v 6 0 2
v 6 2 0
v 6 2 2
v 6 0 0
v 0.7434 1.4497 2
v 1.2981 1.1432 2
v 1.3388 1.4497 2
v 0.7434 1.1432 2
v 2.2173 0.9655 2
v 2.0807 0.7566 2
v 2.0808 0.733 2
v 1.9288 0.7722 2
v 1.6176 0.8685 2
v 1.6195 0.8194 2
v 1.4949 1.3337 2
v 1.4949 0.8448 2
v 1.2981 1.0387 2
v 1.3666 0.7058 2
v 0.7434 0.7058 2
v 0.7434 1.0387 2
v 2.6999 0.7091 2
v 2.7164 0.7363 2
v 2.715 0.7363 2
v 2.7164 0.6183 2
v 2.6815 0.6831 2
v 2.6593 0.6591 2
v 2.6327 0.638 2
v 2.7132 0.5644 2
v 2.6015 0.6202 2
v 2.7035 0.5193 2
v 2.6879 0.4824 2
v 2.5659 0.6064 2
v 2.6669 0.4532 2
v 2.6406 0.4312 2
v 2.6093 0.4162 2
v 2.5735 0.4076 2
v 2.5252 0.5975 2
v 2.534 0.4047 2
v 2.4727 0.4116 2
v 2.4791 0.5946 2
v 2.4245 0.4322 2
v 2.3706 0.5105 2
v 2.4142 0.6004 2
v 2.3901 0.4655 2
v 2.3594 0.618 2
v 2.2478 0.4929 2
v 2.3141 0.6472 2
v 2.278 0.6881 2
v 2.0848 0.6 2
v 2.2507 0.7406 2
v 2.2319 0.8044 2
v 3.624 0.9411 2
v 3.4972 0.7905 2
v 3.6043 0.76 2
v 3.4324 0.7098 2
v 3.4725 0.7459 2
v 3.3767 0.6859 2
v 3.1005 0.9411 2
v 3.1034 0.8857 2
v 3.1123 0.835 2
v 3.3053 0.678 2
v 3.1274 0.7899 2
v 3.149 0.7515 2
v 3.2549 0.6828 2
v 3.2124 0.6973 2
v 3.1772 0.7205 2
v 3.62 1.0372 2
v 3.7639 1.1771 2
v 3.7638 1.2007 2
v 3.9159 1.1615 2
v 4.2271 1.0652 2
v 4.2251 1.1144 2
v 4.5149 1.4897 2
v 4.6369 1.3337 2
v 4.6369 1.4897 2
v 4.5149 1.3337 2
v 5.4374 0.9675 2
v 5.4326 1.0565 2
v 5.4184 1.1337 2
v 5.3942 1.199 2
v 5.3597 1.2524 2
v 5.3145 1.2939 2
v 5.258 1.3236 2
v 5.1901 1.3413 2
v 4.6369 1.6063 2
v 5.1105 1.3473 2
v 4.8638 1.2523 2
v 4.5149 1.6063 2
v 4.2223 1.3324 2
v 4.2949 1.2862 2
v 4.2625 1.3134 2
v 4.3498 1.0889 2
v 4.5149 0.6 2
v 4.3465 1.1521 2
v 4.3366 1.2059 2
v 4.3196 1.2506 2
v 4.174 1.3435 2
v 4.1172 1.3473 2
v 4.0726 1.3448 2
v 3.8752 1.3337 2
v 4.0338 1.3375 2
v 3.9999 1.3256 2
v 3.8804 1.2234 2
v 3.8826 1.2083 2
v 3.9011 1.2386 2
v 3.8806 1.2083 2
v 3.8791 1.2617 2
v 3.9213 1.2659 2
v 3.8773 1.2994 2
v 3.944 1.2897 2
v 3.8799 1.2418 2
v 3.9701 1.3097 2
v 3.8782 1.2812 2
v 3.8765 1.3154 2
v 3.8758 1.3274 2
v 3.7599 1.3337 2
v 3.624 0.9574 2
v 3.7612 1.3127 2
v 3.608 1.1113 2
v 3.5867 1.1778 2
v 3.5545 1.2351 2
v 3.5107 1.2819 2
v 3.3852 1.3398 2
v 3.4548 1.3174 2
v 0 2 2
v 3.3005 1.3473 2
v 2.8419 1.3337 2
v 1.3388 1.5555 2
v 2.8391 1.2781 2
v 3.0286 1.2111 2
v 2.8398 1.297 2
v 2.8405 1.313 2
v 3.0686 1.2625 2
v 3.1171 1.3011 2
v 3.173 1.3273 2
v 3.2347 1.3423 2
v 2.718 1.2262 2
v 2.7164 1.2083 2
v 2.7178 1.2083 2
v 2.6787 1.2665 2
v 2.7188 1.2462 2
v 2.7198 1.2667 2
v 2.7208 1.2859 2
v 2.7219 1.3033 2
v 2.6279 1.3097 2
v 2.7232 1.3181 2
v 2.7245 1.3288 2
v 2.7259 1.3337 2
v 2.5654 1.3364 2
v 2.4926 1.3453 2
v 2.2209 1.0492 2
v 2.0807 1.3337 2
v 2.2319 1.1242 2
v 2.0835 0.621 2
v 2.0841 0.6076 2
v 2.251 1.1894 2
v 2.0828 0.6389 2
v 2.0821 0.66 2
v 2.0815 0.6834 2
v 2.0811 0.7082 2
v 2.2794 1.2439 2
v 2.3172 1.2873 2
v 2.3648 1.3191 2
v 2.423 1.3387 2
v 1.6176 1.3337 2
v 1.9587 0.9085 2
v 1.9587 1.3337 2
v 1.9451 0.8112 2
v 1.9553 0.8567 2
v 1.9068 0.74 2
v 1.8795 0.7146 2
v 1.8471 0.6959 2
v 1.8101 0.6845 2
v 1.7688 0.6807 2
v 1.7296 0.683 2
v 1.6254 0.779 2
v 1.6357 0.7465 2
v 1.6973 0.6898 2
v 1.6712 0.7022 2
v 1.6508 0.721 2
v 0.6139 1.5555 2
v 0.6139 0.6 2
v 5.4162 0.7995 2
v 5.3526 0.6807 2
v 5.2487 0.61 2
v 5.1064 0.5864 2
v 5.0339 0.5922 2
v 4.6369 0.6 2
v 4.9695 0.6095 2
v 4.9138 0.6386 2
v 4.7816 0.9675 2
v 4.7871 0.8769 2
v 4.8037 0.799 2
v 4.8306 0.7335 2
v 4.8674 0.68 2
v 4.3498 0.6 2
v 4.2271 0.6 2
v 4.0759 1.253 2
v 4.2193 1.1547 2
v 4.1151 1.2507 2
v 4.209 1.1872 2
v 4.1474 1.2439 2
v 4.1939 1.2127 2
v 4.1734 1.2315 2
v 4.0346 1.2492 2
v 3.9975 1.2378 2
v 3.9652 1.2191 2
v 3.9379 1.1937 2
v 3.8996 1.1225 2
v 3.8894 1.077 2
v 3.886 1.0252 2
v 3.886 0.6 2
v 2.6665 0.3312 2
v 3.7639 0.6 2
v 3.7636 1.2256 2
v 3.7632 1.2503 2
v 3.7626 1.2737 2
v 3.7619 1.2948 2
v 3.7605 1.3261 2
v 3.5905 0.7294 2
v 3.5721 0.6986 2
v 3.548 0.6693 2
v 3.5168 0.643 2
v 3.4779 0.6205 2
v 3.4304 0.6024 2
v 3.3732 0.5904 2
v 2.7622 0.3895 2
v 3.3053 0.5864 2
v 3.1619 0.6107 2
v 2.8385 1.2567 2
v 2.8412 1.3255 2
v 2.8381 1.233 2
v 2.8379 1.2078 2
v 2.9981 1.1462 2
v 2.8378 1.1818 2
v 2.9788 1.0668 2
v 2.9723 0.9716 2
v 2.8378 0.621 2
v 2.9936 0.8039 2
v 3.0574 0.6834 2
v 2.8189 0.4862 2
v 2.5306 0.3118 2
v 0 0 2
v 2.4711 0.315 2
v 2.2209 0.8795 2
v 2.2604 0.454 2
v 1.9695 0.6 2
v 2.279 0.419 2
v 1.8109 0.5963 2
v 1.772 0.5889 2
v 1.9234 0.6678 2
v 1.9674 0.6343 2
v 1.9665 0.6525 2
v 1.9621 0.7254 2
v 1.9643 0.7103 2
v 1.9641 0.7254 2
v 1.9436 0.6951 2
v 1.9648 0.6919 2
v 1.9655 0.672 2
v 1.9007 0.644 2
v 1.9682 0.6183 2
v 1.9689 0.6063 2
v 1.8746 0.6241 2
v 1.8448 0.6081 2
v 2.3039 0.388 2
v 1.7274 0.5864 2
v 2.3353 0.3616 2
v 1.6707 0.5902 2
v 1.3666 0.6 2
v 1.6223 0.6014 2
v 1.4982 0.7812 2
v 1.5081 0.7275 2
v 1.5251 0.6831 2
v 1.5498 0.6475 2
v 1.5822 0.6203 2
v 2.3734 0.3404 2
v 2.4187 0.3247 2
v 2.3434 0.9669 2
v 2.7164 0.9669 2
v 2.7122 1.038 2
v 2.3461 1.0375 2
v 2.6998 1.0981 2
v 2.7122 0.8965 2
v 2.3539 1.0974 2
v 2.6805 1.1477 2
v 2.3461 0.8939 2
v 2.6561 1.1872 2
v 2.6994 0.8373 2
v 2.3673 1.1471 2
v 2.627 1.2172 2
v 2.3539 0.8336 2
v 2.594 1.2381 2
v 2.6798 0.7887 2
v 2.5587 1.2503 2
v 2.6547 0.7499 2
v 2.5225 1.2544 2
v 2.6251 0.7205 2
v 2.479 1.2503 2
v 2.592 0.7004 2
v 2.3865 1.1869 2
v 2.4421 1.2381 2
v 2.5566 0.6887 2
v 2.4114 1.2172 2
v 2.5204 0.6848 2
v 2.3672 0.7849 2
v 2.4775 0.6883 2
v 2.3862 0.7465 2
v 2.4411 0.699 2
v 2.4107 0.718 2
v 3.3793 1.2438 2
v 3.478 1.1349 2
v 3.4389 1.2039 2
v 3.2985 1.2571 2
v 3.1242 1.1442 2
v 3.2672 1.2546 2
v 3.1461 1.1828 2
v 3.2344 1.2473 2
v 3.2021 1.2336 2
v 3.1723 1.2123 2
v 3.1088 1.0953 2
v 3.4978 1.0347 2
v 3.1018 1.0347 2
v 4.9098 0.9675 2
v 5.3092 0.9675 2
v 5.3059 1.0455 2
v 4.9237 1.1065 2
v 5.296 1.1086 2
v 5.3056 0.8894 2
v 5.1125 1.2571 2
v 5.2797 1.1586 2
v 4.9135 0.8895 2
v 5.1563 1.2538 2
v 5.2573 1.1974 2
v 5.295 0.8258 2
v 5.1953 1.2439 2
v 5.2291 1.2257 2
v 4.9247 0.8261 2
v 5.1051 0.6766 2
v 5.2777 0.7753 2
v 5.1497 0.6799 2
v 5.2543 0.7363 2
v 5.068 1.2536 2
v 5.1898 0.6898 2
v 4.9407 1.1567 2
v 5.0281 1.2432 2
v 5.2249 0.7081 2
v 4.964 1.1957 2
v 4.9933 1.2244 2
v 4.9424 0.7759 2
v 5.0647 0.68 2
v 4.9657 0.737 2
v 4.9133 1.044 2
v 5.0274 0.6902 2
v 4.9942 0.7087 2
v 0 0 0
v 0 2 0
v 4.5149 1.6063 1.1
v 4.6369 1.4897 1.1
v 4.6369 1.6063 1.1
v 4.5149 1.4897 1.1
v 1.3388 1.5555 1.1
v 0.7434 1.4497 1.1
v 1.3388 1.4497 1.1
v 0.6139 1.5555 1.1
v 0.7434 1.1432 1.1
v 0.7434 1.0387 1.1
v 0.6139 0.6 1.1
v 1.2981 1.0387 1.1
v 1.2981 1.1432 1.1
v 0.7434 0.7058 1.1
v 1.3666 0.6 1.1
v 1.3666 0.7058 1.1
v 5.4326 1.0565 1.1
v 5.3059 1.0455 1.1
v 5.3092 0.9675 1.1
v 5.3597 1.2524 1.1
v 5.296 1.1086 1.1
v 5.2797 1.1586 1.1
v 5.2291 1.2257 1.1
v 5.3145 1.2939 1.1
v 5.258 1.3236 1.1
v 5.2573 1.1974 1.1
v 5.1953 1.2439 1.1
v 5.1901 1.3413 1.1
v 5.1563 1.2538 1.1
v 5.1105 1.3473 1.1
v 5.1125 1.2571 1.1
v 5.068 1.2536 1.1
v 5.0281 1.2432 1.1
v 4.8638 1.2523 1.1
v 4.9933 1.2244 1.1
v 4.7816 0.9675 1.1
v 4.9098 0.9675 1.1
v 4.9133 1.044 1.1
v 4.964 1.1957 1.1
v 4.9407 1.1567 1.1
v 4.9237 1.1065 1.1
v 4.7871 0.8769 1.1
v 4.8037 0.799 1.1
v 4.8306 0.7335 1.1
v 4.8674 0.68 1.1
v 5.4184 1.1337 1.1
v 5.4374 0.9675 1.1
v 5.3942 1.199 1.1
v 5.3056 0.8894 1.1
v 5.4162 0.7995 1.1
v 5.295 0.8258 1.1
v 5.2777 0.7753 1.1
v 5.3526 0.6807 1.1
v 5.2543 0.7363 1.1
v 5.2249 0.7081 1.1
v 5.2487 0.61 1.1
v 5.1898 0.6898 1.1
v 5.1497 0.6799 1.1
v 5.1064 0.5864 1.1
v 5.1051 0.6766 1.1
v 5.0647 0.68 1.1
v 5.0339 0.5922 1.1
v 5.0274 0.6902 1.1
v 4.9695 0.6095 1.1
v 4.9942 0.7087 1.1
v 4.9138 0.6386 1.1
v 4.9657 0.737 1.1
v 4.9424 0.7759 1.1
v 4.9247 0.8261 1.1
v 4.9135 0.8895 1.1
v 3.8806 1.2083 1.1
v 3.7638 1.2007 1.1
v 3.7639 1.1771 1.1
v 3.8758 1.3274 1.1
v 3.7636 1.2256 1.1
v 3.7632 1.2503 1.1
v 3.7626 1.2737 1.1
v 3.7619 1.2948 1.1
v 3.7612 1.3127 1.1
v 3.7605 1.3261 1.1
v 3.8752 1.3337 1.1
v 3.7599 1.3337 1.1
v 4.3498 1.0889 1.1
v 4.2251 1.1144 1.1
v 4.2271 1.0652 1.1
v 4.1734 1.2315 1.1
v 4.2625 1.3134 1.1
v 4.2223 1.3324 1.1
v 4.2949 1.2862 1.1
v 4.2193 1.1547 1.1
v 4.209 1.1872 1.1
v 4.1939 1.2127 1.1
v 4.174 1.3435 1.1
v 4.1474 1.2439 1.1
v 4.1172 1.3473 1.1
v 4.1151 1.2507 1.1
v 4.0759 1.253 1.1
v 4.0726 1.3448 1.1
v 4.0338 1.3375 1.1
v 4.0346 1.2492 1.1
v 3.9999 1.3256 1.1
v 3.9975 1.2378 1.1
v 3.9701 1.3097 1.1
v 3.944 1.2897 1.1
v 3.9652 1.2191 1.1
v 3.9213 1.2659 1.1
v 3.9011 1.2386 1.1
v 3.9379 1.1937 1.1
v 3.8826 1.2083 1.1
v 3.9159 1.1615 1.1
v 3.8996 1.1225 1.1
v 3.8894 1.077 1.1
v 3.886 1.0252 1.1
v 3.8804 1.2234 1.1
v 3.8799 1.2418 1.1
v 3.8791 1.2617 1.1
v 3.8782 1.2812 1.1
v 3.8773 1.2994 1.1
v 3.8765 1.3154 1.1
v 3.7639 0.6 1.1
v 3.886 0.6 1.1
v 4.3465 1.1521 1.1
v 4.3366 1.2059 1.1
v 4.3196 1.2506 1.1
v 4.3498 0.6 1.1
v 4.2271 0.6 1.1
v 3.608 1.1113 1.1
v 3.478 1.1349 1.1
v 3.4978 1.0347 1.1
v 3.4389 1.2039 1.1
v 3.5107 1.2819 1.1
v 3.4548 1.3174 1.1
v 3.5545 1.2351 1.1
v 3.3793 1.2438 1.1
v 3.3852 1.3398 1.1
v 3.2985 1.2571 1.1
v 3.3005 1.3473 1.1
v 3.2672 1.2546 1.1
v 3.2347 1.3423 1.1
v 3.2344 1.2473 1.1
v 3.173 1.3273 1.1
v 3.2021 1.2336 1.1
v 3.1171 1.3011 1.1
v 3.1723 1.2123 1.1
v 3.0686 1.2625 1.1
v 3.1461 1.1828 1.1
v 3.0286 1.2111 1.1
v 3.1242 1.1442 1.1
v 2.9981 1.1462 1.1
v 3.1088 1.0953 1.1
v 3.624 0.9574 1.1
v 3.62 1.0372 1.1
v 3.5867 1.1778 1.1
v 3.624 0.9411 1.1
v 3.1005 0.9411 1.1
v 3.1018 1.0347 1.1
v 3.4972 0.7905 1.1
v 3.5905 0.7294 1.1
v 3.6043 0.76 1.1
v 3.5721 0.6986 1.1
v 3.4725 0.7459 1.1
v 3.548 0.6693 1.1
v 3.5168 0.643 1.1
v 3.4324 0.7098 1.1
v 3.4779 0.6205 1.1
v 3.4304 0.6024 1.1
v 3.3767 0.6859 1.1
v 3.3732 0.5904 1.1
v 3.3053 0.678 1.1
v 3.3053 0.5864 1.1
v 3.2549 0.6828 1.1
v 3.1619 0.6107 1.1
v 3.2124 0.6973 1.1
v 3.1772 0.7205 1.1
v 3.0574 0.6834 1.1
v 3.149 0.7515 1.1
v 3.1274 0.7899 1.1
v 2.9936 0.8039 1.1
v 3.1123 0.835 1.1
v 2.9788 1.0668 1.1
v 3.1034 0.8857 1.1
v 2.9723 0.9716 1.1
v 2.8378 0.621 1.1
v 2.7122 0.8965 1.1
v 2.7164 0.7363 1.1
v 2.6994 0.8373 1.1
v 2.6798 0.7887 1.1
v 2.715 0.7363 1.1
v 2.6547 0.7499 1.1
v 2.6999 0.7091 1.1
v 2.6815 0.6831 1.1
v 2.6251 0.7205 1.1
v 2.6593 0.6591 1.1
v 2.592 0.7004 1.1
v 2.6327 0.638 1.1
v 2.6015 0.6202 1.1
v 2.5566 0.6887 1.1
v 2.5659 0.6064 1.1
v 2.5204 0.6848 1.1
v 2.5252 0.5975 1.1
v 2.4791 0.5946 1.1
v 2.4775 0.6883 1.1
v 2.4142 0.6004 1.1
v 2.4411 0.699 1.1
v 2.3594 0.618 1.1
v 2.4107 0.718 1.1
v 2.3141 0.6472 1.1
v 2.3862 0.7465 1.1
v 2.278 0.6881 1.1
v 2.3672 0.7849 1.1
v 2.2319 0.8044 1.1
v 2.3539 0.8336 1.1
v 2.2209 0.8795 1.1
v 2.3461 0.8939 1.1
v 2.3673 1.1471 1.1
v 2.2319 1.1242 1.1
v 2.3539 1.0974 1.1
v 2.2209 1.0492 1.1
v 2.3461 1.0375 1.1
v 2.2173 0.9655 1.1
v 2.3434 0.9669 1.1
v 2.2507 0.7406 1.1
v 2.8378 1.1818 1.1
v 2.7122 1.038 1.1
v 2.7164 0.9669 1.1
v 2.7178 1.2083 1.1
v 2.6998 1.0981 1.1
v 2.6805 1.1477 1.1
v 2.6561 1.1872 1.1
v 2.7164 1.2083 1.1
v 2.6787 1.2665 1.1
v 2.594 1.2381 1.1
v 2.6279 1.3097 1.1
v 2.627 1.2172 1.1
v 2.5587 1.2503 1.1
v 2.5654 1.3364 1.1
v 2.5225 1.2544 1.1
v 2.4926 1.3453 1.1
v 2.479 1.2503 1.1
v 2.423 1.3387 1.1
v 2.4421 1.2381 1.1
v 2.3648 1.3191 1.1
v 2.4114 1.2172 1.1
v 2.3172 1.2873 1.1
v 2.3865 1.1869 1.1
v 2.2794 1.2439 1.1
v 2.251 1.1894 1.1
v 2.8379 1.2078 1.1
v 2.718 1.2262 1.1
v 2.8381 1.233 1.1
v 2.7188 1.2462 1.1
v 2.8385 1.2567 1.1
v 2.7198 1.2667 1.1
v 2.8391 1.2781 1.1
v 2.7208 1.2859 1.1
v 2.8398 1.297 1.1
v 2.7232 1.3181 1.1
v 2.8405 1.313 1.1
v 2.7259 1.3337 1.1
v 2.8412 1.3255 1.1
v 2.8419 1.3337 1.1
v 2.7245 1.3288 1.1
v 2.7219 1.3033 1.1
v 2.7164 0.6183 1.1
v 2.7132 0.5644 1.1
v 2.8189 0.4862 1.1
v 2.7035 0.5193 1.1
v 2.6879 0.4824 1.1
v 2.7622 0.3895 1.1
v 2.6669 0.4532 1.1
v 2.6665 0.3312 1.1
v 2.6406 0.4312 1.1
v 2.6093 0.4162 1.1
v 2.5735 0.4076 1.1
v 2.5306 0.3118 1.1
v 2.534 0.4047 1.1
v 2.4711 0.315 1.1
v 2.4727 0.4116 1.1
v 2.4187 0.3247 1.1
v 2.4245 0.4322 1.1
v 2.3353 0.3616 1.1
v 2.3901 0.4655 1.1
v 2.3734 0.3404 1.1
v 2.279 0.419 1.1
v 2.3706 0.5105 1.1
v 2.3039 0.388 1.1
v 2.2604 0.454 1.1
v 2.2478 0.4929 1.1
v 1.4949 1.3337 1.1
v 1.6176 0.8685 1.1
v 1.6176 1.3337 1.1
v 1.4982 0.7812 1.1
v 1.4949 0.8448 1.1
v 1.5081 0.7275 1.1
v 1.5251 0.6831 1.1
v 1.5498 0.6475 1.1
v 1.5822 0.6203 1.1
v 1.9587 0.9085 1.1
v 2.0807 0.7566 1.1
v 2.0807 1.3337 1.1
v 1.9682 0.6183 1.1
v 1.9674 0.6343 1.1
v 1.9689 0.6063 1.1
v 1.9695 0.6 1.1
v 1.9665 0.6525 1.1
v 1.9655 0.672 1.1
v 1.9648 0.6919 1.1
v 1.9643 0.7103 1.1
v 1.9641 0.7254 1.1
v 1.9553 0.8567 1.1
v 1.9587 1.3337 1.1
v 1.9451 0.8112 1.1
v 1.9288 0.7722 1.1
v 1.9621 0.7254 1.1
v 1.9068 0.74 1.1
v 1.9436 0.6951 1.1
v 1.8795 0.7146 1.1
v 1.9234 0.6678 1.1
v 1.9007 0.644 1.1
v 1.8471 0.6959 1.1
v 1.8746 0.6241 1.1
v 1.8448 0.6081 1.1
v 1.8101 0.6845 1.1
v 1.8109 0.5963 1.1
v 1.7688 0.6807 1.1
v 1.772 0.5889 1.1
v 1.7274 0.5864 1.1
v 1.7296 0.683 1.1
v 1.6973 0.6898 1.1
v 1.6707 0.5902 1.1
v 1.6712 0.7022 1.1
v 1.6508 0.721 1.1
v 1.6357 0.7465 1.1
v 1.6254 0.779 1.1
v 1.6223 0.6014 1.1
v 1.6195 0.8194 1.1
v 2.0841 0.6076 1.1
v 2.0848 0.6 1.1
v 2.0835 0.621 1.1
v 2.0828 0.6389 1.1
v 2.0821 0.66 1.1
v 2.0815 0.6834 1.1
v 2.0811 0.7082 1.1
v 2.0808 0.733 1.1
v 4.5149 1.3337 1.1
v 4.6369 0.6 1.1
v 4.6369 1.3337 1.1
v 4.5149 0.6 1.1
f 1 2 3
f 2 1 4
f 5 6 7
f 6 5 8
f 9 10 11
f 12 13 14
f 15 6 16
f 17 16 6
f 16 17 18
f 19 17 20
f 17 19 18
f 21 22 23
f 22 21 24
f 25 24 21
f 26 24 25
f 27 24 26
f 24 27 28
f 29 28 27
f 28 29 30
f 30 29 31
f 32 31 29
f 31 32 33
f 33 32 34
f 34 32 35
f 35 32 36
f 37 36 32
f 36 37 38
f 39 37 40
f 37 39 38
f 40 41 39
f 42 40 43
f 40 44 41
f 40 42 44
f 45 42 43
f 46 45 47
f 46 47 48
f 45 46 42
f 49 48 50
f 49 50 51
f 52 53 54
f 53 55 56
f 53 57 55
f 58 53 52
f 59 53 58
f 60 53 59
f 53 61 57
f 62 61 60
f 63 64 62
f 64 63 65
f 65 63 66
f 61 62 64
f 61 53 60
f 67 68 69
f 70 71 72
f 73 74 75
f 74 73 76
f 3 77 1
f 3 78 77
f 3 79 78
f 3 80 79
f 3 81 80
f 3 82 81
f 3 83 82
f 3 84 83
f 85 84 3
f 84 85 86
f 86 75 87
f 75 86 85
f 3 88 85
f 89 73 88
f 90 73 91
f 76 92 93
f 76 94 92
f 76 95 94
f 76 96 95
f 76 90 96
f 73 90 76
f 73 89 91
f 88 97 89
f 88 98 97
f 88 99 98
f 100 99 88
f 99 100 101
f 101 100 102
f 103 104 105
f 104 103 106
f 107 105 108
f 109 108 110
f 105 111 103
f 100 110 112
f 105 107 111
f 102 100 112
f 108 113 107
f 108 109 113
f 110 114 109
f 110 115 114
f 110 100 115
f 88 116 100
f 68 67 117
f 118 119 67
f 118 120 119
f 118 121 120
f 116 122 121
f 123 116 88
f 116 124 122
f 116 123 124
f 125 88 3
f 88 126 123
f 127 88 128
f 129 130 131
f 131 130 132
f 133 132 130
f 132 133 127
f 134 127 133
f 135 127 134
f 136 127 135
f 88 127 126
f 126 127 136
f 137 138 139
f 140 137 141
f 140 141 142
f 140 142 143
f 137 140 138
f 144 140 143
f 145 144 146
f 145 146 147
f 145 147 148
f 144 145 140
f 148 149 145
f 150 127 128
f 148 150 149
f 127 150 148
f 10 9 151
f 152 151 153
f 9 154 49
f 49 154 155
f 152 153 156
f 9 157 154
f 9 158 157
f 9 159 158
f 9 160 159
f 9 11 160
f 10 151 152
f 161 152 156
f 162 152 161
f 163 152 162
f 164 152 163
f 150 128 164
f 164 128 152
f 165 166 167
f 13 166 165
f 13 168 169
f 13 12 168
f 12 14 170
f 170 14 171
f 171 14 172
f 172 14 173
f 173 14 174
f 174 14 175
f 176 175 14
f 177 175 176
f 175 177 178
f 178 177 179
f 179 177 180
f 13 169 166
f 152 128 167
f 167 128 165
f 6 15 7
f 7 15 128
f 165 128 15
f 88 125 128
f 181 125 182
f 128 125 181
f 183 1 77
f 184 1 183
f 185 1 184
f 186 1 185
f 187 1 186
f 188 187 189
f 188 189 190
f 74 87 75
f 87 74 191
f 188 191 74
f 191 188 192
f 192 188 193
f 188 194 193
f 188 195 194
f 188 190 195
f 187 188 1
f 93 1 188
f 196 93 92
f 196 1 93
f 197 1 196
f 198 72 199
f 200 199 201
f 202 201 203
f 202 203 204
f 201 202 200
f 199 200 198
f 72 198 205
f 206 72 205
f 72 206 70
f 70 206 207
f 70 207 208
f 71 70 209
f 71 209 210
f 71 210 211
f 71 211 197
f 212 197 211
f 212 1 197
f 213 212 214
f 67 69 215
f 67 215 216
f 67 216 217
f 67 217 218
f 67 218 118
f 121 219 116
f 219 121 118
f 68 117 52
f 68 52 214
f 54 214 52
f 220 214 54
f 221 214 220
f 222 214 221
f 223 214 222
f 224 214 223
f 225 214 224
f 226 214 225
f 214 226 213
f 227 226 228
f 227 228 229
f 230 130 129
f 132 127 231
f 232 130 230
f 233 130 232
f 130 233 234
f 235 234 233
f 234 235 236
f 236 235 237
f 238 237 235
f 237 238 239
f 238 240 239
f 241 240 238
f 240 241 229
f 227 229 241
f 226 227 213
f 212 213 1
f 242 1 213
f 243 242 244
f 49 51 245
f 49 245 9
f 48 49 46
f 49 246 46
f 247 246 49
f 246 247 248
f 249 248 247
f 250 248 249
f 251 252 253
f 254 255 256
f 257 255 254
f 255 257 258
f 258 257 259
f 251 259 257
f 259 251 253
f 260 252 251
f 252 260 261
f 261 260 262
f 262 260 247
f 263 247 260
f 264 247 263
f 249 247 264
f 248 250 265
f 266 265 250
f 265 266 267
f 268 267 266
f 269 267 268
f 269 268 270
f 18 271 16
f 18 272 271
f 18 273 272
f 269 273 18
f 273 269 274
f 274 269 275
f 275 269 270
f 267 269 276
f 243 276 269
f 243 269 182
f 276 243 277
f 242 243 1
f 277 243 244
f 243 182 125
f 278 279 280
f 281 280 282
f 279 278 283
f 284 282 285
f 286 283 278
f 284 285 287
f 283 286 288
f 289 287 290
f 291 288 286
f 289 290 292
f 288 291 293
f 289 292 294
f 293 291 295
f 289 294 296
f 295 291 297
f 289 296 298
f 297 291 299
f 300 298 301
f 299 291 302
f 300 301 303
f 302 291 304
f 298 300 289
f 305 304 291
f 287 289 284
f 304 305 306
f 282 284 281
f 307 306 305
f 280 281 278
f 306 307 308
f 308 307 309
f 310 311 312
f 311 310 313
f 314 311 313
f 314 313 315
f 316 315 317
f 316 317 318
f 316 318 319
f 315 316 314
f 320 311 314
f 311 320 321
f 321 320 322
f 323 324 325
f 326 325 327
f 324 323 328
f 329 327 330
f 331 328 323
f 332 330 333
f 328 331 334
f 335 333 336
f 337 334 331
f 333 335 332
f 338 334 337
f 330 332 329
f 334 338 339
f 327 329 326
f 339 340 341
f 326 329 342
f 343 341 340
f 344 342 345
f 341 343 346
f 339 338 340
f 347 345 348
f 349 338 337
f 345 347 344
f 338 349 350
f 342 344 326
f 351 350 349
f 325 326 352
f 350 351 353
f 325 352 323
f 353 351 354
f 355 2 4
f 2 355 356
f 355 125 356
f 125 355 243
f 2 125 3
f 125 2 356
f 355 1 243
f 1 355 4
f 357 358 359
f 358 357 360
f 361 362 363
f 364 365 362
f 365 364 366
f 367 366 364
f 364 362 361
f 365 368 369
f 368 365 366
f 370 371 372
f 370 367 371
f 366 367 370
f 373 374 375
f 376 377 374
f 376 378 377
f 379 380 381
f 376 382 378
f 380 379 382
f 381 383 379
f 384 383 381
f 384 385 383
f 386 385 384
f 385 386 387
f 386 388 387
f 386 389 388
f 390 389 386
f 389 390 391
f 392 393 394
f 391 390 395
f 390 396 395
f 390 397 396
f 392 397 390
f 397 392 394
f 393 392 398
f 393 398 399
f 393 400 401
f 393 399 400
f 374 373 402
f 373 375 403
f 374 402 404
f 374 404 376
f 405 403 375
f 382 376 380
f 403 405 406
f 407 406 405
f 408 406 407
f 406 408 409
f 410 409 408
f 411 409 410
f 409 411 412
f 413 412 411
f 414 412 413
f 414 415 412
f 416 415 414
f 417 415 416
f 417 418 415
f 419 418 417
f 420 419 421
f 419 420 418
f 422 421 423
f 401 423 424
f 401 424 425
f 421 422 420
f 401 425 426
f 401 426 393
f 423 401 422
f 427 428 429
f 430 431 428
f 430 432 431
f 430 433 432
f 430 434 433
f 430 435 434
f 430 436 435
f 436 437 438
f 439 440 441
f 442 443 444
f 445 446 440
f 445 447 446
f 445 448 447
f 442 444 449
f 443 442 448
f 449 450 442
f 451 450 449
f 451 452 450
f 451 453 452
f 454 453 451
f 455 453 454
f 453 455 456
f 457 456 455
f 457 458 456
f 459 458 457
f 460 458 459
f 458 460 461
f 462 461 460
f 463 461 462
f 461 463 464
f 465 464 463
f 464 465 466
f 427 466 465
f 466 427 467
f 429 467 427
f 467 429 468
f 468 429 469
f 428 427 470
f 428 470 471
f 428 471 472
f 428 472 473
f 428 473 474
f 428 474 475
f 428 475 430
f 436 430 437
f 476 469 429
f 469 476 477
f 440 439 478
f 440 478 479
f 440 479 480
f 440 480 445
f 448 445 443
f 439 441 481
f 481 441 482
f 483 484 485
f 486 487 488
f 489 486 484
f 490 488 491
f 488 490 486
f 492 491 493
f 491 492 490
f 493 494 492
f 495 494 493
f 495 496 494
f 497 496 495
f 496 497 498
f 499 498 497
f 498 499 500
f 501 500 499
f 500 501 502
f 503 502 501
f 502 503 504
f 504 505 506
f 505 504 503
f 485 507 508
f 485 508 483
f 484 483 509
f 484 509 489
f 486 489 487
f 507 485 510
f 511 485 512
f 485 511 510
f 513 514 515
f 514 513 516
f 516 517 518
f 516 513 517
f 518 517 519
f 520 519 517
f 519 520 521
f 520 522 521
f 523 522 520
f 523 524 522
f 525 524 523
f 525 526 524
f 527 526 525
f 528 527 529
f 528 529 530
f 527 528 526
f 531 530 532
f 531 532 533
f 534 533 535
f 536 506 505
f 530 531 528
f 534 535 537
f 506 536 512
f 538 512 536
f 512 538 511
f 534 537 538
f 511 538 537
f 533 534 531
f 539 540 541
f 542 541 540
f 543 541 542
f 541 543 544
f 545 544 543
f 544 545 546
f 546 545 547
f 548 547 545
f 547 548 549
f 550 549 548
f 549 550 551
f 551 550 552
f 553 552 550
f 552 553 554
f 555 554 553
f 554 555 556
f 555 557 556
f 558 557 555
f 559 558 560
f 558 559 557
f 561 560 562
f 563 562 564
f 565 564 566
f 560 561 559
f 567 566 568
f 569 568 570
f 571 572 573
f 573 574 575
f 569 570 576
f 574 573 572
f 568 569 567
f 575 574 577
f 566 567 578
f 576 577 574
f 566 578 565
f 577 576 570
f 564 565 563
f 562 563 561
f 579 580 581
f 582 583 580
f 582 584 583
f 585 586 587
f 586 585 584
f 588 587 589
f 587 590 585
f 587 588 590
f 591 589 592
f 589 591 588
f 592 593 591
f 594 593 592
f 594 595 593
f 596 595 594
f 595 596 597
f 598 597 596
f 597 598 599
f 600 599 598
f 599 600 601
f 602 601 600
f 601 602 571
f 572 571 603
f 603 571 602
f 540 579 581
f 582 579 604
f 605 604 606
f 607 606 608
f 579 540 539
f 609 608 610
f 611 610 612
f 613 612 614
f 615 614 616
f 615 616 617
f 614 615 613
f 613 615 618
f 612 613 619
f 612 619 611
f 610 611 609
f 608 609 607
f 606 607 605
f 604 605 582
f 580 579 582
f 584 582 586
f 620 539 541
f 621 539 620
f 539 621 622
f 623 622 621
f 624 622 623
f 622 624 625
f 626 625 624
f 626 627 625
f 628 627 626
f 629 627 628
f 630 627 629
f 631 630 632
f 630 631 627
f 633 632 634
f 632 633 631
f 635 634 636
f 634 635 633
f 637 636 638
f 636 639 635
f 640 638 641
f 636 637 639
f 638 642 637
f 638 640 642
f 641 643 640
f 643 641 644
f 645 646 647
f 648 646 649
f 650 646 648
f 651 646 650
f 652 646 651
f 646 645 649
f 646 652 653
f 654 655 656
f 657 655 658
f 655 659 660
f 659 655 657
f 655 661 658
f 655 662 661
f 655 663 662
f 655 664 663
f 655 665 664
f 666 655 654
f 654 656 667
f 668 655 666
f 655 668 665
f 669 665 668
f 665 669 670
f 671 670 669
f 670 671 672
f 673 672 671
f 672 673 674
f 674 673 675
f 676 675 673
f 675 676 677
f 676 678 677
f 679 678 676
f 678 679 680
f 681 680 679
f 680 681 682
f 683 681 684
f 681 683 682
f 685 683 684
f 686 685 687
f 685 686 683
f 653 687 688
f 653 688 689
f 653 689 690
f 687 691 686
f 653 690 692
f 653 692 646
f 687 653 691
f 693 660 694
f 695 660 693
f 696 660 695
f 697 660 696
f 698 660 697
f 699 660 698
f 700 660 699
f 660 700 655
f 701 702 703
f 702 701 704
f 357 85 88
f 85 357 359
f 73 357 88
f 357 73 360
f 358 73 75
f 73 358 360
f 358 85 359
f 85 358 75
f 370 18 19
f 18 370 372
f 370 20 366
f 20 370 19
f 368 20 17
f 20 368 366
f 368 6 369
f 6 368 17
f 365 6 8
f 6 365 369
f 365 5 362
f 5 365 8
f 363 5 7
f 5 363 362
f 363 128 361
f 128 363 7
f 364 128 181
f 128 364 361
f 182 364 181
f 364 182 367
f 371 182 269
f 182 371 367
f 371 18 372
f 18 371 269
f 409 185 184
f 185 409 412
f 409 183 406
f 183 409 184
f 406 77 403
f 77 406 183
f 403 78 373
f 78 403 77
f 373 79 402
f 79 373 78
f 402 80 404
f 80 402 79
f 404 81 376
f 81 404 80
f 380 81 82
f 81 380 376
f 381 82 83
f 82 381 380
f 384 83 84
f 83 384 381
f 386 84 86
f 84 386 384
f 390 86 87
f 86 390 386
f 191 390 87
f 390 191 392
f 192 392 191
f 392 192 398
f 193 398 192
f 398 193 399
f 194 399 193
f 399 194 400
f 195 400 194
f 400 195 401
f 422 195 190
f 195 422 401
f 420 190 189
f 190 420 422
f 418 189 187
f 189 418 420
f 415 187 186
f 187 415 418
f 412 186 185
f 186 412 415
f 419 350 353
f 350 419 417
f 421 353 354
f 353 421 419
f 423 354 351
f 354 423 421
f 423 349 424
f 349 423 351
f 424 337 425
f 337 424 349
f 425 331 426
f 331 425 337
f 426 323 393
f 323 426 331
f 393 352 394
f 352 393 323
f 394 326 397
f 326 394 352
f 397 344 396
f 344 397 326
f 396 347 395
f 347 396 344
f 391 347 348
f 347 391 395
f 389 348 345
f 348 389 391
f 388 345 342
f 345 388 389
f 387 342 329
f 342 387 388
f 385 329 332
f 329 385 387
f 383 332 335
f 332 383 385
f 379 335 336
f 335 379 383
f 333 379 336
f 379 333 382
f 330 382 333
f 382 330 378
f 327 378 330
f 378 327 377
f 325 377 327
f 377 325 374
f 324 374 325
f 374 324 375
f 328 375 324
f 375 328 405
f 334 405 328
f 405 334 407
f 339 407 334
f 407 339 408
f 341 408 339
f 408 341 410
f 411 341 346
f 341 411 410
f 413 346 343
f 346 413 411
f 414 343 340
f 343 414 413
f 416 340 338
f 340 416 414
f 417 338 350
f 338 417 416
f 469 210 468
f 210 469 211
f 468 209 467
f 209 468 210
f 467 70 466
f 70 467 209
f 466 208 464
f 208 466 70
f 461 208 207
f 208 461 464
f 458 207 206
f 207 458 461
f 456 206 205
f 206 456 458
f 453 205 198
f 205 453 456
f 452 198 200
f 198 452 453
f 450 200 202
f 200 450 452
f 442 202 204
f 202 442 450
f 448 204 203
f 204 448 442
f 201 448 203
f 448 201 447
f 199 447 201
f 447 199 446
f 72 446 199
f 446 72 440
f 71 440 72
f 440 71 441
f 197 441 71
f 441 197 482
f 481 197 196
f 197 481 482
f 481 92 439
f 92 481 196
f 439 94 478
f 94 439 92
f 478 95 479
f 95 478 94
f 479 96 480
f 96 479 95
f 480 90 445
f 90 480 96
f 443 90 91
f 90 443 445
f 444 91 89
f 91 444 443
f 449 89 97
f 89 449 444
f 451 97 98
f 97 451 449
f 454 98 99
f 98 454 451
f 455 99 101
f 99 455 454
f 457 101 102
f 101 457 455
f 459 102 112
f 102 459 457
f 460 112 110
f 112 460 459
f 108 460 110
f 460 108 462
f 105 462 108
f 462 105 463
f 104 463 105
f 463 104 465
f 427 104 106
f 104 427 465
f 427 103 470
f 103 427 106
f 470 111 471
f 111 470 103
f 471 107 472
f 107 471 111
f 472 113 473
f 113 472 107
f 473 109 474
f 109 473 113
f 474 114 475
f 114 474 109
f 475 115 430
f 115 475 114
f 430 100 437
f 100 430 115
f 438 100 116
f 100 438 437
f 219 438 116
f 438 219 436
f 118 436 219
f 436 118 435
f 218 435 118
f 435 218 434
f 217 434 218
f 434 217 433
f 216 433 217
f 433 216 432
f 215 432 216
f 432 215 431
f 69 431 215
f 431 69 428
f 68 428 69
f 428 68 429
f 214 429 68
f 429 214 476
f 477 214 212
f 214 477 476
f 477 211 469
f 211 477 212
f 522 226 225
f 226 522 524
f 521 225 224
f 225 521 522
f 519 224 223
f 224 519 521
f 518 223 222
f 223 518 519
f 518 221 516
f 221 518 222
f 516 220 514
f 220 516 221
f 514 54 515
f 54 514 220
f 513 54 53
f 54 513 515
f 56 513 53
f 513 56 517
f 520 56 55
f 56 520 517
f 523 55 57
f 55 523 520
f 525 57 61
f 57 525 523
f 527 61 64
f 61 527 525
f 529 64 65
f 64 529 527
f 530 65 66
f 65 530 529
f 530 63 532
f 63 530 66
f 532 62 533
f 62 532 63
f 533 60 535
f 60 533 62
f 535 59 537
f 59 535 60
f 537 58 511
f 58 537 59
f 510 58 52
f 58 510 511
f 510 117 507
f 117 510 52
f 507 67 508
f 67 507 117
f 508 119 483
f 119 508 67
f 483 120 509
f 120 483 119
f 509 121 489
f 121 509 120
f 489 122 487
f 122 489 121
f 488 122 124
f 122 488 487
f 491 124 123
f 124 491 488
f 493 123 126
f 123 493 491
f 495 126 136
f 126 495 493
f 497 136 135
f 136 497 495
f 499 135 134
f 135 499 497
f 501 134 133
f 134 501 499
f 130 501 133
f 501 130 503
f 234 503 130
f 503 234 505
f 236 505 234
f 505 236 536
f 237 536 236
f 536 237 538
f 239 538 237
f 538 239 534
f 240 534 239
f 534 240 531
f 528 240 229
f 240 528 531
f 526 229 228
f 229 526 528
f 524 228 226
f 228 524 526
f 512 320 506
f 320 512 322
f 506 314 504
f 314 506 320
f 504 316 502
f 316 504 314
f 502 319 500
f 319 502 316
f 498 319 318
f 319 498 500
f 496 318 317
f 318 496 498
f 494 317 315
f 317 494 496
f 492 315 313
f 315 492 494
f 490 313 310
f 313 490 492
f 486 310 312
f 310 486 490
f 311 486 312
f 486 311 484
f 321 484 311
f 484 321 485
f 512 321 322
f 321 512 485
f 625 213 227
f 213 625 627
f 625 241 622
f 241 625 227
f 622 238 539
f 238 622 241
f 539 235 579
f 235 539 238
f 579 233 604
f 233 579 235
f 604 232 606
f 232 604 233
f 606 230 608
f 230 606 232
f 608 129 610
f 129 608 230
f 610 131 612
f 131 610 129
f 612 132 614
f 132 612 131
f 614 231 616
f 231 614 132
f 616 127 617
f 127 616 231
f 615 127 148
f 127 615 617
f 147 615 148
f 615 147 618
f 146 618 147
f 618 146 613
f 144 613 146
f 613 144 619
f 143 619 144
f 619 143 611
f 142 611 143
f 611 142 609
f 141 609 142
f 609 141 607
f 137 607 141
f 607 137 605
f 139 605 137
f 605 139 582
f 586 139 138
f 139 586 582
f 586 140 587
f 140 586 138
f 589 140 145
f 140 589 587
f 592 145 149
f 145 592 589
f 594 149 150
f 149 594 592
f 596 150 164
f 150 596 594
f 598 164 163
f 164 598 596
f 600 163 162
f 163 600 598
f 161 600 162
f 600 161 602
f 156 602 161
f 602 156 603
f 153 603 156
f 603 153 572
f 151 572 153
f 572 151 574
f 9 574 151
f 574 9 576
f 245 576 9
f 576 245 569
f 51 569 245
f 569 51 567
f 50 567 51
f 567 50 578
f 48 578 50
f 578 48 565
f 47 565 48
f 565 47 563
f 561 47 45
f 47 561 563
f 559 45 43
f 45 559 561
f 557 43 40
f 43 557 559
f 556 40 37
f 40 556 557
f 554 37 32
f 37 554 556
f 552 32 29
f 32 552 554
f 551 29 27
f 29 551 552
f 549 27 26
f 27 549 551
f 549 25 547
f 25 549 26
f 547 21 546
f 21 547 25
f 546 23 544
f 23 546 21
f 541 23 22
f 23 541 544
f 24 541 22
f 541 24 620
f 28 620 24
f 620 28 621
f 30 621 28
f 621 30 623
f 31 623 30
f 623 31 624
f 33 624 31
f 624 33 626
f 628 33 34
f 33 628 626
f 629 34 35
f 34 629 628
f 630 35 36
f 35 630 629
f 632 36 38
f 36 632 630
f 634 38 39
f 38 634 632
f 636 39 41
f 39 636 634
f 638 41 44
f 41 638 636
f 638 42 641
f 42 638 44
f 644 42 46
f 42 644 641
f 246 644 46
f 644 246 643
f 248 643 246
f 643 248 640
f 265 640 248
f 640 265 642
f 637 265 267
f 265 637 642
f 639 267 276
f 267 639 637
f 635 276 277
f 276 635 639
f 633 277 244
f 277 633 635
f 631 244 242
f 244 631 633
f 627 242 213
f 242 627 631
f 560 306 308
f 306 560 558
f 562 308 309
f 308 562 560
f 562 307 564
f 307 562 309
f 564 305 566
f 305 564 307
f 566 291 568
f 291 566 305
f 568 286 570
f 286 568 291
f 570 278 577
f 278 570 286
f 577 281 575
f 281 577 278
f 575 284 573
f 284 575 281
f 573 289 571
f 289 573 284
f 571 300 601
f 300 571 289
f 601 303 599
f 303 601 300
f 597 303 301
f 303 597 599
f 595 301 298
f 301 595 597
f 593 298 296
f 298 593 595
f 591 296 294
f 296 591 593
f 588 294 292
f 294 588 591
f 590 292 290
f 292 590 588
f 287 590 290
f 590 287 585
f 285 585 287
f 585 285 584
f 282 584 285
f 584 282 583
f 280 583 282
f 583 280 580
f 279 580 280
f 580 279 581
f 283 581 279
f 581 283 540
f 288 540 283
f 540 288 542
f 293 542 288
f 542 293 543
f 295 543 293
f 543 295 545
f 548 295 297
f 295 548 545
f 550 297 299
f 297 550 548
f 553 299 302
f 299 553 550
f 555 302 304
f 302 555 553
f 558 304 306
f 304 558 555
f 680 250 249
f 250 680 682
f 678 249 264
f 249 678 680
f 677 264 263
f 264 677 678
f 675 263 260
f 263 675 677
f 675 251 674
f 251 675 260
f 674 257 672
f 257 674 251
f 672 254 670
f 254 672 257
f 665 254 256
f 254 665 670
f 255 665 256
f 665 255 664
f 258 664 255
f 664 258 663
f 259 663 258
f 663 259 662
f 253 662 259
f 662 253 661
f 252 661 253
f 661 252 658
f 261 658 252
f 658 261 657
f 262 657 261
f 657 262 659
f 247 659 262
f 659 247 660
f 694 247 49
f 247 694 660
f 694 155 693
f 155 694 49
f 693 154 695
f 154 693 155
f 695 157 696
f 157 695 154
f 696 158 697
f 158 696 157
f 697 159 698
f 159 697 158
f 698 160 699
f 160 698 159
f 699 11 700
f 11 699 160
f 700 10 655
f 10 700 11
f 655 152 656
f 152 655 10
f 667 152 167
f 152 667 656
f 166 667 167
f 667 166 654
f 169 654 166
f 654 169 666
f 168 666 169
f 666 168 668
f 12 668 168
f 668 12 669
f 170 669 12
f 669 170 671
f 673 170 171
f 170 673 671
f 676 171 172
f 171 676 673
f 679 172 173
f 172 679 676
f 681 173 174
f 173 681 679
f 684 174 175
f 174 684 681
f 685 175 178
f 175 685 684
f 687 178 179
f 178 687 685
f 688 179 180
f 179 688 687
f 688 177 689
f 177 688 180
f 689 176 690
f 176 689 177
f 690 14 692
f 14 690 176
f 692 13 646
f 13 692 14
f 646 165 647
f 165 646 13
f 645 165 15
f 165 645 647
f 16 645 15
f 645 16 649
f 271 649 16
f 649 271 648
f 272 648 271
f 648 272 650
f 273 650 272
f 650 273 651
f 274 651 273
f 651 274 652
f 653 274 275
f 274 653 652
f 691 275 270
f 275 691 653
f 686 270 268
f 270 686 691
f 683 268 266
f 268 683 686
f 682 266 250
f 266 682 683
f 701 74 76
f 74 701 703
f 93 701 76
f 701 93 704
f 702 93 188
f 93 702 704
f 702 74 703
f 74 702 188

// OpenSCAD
difference()
{
    cube([6,2,2]);
    translate([0.5,0.6,1.1])
    linear_extrude(1)
        text("Eugenio", size=1);
}
